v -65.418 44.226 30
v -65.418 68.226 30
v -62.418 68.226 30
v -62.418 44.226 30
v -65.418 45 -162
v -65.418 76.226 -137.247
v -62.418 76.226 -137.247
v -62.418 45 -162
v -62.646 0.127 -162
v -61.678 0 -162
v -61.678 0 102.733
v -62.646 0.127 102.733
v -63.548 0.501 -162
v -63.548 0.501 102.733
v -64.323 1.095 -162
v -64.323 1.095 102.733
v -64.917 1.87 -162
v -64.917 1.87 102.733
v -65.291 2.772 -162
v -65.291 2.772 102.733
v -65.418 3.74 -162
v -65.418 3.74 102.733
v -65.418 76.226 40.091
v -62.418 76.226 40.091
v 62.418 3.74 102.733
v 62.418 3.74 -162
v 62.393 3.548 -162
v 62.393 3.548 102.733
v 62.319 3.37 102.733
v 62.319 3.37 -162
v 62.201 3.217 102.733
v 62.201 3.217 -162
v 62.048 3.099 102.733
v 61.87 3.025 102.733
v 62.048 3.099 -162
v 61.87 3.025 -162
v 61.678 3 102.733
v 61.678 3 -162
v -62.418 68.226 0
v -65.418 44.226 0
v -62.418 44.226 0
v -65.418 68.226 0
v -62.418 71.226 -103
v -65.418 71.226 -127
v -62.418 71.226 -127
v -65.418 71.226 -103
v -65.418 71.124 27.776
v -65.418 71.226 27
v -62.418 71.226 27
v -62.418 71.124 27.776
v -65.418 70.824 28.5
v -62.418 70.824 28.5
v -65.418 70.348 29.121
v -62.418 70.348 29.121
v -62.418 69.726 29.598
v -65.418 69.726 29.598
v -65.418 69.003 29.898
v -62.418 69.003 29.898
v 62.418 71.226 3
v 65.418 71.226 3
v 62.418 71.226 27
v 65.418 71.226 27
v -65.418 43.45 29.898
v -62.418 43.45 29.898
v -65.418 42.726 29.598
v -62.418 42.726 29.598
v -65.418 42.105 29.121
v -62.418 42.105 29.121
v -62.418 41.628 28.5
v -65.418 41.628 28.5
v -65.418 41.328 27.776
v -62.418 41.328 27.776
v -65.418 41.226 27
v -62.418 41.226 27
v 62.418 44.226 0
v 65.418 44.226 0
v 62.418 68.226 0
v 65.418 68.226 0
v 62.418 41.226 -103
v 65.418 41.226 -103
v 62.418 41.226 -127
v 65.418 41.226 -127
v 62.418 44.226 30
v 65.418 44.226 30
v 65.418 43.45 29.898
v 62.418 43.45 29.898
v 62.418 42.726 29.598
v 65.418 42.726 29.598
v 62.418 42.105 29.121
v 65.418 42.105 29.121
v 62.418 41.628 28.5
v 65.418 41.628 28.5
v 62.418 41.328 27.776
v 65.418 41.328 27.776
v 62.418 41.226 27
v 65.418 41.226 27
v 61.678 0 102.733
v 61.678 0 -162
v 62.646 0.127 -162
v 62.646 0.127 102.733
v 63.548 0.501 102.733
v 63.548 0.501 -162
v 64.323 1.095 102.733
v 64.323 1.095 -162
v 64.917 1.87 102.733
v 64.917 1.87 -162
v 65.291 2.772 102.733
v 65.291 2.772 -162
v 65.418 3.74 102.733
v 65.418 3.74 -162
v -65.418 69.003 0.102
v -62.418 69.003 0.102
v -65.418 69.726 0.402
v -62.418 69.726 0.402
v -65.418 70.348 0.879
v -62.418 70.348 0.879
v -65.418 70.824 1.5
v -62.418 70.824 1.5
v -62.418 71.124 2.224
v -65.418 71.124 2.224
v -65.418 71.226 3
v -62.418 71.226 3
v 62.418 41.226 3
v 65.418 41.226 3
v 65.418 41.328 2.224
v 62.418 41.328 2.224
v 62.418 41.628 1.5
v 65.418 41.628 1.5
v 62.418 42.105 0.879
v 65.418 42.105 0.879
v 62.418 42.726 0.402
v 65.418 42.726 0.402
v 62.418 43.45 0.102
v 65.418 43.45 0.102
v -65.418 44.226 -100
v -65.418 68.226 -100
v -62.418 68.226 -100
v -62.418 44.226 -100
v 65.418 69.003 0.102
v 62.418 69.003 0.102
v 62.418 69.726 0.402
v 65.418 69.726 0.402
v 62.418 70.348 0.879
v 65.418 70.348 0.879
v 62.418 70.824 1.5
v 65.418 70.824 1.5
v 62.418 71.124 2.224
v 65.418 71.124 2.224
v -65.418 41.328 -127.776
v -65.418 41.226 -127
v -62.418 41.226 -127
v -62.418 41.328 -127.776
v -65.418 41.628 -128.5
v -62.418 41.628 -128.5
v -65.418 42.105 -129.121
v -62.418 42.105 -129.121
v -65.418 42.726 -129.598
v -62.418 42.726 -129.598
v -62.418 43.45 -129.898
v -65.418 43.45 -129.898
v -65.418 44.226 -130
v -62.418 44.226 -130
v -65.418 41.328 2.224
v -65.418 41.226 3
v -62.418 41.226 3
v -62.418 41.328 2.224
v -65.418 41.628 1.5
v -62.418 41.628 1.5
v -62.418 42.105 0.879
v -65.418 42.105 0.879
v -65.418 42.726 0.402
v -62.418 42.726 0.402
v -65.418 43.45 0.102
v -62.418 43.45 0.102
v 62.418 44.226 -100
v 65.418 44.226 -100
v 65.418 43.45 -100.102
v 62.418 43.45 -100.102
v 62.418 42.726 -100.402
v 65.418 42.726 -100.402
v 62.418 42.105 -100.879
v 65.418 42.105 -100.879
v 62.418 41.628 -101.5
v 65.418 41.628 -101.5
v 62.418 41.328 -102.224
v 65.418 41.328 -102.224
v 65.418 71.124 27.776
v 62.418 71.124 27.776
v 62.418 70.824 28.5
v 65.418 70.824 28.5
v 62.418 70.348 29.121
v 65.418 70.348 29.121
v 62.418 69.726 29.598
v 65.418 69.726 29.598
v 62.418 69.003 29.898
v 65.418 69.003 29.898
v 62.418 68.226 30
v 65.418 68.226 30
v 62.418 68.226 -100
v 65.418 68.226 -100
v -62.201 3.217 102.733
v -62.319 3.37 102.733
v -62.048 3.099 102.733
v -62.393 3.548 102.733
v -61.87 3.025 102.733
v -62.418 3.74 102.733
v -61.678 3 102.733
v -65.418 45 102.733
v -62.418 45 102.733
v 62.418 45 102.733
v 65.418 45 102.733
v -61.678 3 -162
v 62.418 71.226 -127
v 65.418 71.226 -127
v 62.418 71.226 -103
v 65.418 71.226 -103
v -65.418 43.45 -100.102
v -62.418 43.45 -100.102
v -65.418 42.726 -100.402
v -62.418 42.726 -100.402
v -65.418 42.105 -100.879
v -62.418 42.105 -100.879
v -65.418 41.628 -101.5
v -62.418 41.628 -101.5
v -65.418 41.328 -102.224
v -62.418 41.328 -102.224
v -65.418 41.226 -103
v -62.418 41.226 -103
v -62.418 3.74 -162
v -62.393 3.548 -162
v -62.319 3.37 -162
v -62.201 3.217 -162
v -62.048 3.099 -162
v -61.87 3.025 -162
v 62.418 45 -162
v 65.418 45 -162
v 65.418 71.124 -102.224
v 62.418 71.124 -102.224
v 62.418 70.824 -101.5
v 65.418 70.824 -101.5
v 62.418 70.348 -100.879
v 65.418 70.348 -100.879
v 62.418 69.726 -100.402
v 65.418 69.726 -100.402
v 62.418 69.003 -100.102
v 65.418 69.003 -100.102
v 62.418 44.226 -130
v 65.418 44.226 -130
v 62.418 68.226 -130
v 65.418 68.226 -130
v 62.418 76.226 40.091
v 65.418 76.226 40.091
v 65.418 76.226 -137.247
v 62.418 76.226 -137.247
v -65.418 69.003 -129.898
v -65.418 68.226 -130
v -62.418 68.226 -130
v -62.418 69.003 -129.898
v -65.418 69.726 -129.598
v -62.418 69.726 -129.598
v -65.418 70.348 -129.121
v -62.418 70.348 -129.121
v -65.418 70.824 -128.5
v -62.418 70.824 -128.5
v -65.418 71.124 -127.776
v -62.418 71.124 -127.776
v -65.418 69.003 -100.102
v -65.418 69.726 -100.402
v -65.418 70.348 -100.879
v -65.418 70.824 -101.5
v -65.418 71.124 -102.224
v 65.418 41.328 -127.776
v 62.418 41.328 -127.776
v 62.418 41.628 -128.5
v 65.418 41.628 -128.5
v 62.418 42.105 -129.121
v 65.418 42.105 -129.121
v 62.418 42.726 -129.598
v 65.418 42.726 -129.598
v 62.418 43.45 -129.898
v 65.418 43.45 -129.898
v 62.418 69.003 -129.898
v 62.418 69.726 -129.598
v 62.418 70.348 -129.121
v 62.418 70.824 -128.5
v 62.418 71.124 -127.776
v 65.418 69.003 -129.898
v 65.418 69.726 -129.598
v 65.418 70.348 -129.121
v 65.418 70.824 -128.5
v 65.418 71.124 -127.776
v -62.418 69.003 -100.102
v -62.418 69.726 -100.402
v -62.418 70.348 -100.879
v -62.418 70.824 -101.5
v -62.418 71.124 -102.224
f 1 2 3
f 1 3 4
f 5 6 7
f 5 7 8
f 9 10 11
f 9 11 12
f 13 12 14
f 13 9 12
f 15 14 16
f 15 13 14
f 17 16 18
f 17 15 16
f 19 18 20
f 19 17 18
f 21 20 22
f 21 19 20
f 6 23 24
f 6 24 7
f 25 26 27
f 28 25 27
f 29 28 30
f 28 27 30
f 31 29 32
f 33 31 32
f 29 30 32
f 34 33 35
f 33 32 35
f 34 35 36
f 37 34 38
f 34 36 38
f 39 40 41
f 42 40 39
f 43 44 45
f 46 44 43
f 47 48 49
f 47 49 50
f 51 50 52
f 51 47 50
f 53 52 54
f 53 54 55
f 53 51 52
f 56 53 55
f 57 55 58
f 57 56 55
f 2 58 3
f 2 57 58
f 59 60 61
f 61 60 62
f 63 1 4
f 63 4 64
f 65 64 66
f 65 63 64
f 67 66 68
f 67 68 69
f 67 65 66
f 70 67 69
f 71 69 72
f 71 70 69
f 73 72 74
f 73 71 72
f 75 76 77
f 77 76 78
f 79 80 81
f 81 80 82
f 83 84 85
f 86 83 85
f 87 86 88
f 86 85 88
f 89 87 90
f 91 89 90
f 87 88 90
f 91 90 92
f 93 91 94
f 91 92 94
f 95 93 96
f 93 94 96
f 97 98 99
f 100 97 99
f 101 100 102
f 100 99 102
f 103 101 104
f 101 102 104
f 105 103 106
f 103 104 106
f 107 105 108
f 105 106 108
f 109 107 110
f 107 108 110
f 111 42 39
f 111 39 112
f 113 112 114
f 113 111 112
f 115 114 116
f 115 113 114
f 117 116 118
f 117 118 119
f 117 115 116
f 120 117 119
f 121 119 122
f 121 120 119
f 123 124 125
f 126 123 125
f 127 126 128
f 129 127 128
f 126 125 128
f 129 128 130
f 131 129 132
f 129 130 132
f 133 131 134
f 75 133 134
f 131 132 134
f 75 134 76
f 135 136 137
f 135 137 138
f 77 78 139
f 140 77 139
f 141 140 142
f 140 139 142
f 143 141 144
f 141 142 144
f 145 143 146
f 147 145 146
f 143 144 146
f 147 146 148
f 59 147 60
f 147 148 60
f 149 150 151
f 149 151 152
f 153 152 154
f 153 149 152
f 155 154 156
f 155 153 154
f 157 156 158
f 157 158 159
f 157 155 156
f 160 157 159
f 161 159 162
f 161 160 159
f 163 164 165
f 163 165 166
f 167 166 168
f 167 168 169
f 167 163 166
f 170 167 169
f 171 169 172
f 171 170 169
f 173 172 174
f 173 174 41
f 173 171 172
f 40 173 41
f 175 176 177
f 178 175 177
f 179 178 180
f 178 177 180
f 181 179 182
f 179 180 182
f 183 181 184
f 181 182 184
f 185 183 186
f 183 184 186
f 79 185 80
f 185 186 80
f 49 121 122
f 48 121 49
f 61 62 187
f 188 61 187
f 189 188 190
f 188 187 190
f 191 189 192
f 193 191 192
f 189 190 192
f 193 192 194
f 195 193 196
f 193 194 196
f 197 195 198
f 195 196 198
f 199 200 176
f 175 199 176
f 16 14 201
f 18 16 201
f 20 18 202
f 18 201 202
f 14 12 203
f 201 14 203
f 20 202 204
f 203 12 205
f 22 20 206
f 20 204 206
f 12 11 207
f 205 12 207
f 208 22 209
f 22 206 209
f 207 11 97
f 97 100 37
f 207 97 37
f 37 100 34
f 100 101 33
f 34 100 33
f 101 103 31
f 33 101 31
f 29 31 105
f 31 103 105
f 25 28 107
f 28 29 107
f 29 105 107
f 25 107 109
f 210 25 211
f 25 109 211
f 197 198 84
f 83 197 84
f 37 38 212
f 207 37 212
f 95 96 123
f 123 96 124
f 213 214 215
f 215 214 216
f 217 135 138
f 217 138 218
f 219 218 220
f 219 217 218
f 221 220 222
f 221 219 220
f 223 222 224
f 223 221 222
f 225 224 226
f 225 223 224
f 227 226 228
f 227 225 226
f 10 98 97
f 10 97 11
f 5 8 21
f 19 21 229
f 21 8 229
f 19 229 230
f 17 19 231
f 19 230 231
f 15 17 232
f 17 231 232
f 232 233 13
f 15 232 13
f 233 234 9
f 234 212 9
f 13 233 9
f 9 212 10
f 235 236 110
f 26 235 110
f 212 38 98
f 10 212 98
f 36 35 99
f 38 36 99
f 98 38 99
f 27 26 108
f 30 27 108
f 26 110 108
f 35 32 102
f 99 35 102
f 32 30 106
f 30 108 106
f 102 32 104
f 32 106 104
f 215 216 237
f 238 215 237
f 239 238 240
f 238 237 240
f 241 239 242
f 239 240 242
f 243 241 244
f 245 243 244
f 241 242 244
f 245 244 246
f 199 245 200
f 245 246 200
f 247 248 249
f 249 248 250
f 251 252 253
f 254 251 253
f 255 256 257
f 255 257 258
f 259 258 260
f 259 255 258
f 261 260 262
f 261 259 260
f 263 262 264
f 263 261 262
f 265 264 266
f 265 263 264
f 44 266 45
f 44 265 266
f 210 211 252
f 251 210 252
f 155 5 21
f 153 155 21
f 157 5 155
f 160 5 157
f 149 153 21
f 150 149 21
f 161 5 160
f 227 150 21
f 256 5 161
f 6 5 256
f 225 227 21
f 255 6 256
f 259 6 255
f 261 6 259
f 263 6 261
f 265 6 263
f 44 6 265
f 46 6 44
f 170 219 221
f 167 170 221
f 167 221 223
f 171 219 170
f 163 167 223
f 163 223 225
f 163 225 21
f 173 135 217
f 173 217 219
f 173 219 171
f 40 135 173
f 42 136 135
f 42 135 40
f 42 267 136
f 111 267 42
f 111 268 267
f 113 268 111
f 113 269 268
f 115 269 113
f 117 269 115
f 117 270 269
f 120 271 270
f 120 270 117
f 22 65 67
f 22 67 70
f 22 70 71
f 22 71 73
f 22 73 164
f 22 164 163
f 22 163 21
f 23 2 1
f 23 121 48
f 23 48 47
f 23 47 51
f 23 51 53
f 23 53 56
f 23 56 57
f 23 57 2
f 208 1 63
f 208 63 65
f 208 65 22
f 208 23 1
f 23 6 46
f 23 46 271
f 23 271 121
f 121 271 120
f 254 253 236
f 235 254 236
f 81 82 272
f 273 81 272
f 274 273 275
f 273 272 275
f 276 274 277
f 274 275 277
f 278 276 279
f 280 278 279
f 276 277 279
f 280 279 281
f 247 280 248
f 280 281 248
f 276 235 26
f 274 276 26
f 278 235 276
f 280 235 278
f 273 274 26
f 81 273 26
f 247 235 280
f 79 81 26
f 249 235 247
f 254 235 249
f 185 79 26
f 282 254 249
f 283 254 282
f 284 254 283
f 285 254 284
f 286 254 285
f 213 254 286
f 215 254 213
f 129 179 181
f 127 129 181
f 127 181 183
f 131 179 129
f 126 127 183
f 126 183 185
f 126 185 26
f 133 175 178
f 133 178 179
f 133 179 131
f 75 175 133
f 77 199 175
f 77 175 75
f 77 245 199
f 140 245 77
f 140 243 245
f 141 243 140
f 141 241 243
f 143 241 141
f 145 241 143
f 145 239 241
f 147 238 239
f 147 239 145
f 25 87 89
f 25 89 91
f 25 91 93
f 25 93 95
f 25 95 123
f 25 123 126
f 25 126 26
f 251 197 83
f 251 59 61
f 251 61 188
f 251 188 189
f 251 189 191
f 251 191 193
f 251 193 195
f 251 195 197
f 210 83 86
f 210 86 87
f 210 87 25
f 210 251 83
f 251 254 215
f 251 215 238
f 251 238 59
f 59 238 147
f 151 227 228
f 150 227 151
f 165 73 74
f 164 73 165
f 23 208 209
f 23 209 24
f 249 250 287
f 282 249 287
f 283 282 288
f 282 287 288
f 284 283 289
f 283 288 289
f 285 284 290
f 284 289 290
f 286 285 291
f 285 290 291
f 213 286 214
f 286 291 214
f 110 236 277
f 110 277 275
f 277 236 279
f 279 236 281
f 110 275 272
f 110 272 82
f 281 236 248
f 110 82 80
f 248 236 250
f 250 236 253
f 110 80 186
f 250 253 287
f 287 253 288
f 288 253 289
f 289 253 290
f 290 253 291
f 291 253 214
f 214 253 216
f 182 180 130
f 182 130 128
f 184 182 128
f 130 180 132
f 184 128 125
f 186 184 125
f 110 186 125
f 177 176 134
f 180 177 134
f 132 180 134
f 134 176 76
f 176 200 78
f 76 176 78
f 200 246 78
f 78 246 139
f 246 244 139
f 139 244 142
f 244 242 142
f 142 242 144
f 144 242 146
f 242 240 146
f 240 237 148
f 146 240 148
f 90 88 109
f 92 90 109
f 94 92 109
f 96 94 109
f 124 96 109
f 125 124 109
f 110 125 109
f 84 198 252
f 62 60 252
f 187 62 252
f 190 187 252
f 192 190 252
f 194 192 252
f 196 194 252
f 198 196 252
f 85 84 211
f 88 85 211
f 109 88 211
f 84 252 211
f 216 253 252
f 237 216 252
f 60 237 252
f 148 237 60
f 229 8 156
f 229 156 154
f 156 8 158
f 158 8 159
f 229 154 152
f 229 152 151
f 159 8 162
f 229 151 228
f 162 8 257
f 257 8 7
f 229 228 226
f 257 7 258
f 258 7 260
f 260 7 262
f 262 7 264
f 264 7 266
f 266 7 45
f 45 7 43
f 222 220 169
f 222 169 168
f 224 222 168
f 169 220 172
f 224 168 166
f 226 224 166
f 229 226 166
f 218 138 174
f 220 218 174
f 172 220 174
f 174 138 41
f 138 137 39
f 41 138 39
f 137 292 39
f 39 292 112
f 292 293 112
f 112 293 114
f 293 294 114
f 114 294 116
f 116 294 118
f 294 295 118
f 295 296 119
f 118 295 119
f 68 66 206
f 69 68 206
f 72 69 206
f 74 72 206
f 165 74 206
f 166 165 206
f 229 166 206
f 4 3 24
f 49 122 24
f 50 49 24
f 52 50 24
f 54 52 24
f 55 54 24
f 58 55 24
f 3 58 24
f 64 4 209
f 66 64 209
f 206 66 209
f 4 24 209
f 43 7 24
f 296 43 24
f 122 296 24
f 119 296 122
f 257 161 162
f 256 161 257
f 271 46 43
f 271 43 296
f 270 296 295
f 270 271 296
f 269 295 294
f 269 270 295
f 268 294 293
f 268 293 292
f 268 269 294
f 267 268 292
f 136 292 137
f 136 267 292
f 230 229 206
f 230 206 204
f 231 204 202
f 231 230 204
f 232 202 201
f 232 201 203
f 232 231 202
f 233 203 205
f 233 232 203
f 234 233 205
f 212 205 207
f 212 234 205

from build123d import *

# Parameters (mm, degrees)
SKETCH_1_W                       = 65.418154724
SKETCH_1_H                       = 264.733197448
SM_BASE_FLANGE_1_DEPTH           = 3
SM_EDGE_FLANGE_1_STRIP_W         = 13.48
SM_EDGE_FLANGE_1_STRIP_H         = 3
SM_EDGE_FLANGE_1_STRIP_CUT_DEPTH = 264.733197448
SM_EDGE_FLANGE_1_DEPTH           = 264.733197448
SM_EDGE_FLANGE_1_FLAT_DEPTH      = 3
OTHER_START                      = -65.418154724
OTHER_1_DEPTH                    = 3


# Read off the part's stored shape, not the designer's step: Полость1
# Sheet-metal steps are written as plain solids
with BuildPart() as part:
    # Sketch 1 → Базовая кромка1 (new body)
    with BuildSketch(Plane(origin=(0, 0, 0), x_dir=(1, 0, 0), z_dir=(0, 1, 0))):
        with Locations((-32.709077362, 29.633401276)):
            Rectangle(SKETCH_1_W, SKETCH_1_H)
    extrude(amount=SM_BASE_FLANGE_1_DEPTH)

    # Ребро-кромка1 strip (across the edge) → Ребро-кромка1 strip cut (cut)
    with BuildSketch(Plane(origin=(-65.418154724, 3, -162), x_dir=(1, 0, 0), z_dir=(0, 0, 1))):
        with Locations((-3, -1.5)):
            Rectangle(SM_EDGE_FLANGE_1_STRIP_W, SM_EDGE_FLANGE_1_STRIP_H)
    extrude(amount=SM_EDGE_FLANGE_1_STRIP_CUT_DEPTH, mode=Mode.SUBTRACT)

    # Ребро-кромка1 bend section (across the edge) → Ребро-кромка1 (add)
    with BuildSketch(Plane(origin=(-65.418154724, 3, -162), x_dir=(1, 0, 0), z_dir=(0, 0, 1))):
        with BuildLine():
            Line((0, 0.74), (3, 0.74))
            ThreePointArc((3, 0.74), (3.216740982, 0.216740982), (3.74, 0))
            Line((3.74, 0), (3.74, -3))
            ThreePointArc((3.74, -3), (1.095420638, -1.904579362), (0, 0.74))
        make_face()
    extrude(amount=SM_EDGE_FLANGE_1_DEPTH)

    # Ребро-кромка1 profile (on flange) → Ребро-кромка1 flat (add)
    with BuildSketch(Plane(origin=(-65.418154724, 3, 0), x_dir=(0, 0, 1), z_dir=(-1, 0, 0))):
        Polygon((-162, 0.74), (102.733197448, 0.74), (102.733197448, 42), (40.090960975, 73.22618932), (-137.247403995, 73.22618932), (-162, 42), align=None)
    extrude(amount=-SM_EDGE_FLANGE_1_FLAT_DEPTH)

    # Полость1 outline → Полость1 (cut)
    with BuildSketch(Plane.YZ.offset(OTHER_START)):
        with BuildLine():
            ThreePointArc((44.22618932, 30), (42.104868976, 29.121320344), (41.22618932, 27))
            Line((41.22618932, 27), (41.22618932, 3))
            ThreePointArc((41.22618932, 3), (42.104868976, 0.878679656), (44.22618932, 0))
            Line((44.22618932, 0), (68.22618932, 0))
            ThreePointArc((68.22618932, 0), (70.347509663, 0.878679657), (71.22618932, 3))
            Line((71.22618932, 3), (71.22618932, 27))
            ThreePointArc((71.22618932, 27), (70.347509663, 29.121320343), (68.22618932, 30))
            Line((68.22618932, 30), (44.22618932, 30))
        make_face()
        with BuildLine():
            ThreePointArc((44.22618932, -100), (42.104868976, -100.878679656), (41.22618932, -103))
            Line((41.22618932, -103), (41.22618932, -127))
            ThreePointArc((41.22618932, -127), (42.104868976, -129.121320344), (44.22618932, -130))
            Line((44.22618932, -130), (68.22618932, -130))
            ThreePointArc((68.22618932, -130), (70.347509663, -129.121320344), (71.22618932, -127))
            Line((71.22618932, -127), (71.22618932, -103))
            ThreePointArc((71.22618932, -103), (70.347509663, -100.878679656), (68.22618932, -100))
            Line((68.22618932, -100), (44.22618932, -100))
        make_face()
    extrude(amount=OTHER_1_DEPTH, mode=Mode.SUBTRACT)

    # Зеркальное отражение1: part across plane


with BuildPart() as part_1:
    add(part.part)
    add(part.part.mirror(Plane(origin=(0, 3, -162), x_dir=(0, 0, 1), z_dir=(-1, 0, 0))))


solid = part_1.part
